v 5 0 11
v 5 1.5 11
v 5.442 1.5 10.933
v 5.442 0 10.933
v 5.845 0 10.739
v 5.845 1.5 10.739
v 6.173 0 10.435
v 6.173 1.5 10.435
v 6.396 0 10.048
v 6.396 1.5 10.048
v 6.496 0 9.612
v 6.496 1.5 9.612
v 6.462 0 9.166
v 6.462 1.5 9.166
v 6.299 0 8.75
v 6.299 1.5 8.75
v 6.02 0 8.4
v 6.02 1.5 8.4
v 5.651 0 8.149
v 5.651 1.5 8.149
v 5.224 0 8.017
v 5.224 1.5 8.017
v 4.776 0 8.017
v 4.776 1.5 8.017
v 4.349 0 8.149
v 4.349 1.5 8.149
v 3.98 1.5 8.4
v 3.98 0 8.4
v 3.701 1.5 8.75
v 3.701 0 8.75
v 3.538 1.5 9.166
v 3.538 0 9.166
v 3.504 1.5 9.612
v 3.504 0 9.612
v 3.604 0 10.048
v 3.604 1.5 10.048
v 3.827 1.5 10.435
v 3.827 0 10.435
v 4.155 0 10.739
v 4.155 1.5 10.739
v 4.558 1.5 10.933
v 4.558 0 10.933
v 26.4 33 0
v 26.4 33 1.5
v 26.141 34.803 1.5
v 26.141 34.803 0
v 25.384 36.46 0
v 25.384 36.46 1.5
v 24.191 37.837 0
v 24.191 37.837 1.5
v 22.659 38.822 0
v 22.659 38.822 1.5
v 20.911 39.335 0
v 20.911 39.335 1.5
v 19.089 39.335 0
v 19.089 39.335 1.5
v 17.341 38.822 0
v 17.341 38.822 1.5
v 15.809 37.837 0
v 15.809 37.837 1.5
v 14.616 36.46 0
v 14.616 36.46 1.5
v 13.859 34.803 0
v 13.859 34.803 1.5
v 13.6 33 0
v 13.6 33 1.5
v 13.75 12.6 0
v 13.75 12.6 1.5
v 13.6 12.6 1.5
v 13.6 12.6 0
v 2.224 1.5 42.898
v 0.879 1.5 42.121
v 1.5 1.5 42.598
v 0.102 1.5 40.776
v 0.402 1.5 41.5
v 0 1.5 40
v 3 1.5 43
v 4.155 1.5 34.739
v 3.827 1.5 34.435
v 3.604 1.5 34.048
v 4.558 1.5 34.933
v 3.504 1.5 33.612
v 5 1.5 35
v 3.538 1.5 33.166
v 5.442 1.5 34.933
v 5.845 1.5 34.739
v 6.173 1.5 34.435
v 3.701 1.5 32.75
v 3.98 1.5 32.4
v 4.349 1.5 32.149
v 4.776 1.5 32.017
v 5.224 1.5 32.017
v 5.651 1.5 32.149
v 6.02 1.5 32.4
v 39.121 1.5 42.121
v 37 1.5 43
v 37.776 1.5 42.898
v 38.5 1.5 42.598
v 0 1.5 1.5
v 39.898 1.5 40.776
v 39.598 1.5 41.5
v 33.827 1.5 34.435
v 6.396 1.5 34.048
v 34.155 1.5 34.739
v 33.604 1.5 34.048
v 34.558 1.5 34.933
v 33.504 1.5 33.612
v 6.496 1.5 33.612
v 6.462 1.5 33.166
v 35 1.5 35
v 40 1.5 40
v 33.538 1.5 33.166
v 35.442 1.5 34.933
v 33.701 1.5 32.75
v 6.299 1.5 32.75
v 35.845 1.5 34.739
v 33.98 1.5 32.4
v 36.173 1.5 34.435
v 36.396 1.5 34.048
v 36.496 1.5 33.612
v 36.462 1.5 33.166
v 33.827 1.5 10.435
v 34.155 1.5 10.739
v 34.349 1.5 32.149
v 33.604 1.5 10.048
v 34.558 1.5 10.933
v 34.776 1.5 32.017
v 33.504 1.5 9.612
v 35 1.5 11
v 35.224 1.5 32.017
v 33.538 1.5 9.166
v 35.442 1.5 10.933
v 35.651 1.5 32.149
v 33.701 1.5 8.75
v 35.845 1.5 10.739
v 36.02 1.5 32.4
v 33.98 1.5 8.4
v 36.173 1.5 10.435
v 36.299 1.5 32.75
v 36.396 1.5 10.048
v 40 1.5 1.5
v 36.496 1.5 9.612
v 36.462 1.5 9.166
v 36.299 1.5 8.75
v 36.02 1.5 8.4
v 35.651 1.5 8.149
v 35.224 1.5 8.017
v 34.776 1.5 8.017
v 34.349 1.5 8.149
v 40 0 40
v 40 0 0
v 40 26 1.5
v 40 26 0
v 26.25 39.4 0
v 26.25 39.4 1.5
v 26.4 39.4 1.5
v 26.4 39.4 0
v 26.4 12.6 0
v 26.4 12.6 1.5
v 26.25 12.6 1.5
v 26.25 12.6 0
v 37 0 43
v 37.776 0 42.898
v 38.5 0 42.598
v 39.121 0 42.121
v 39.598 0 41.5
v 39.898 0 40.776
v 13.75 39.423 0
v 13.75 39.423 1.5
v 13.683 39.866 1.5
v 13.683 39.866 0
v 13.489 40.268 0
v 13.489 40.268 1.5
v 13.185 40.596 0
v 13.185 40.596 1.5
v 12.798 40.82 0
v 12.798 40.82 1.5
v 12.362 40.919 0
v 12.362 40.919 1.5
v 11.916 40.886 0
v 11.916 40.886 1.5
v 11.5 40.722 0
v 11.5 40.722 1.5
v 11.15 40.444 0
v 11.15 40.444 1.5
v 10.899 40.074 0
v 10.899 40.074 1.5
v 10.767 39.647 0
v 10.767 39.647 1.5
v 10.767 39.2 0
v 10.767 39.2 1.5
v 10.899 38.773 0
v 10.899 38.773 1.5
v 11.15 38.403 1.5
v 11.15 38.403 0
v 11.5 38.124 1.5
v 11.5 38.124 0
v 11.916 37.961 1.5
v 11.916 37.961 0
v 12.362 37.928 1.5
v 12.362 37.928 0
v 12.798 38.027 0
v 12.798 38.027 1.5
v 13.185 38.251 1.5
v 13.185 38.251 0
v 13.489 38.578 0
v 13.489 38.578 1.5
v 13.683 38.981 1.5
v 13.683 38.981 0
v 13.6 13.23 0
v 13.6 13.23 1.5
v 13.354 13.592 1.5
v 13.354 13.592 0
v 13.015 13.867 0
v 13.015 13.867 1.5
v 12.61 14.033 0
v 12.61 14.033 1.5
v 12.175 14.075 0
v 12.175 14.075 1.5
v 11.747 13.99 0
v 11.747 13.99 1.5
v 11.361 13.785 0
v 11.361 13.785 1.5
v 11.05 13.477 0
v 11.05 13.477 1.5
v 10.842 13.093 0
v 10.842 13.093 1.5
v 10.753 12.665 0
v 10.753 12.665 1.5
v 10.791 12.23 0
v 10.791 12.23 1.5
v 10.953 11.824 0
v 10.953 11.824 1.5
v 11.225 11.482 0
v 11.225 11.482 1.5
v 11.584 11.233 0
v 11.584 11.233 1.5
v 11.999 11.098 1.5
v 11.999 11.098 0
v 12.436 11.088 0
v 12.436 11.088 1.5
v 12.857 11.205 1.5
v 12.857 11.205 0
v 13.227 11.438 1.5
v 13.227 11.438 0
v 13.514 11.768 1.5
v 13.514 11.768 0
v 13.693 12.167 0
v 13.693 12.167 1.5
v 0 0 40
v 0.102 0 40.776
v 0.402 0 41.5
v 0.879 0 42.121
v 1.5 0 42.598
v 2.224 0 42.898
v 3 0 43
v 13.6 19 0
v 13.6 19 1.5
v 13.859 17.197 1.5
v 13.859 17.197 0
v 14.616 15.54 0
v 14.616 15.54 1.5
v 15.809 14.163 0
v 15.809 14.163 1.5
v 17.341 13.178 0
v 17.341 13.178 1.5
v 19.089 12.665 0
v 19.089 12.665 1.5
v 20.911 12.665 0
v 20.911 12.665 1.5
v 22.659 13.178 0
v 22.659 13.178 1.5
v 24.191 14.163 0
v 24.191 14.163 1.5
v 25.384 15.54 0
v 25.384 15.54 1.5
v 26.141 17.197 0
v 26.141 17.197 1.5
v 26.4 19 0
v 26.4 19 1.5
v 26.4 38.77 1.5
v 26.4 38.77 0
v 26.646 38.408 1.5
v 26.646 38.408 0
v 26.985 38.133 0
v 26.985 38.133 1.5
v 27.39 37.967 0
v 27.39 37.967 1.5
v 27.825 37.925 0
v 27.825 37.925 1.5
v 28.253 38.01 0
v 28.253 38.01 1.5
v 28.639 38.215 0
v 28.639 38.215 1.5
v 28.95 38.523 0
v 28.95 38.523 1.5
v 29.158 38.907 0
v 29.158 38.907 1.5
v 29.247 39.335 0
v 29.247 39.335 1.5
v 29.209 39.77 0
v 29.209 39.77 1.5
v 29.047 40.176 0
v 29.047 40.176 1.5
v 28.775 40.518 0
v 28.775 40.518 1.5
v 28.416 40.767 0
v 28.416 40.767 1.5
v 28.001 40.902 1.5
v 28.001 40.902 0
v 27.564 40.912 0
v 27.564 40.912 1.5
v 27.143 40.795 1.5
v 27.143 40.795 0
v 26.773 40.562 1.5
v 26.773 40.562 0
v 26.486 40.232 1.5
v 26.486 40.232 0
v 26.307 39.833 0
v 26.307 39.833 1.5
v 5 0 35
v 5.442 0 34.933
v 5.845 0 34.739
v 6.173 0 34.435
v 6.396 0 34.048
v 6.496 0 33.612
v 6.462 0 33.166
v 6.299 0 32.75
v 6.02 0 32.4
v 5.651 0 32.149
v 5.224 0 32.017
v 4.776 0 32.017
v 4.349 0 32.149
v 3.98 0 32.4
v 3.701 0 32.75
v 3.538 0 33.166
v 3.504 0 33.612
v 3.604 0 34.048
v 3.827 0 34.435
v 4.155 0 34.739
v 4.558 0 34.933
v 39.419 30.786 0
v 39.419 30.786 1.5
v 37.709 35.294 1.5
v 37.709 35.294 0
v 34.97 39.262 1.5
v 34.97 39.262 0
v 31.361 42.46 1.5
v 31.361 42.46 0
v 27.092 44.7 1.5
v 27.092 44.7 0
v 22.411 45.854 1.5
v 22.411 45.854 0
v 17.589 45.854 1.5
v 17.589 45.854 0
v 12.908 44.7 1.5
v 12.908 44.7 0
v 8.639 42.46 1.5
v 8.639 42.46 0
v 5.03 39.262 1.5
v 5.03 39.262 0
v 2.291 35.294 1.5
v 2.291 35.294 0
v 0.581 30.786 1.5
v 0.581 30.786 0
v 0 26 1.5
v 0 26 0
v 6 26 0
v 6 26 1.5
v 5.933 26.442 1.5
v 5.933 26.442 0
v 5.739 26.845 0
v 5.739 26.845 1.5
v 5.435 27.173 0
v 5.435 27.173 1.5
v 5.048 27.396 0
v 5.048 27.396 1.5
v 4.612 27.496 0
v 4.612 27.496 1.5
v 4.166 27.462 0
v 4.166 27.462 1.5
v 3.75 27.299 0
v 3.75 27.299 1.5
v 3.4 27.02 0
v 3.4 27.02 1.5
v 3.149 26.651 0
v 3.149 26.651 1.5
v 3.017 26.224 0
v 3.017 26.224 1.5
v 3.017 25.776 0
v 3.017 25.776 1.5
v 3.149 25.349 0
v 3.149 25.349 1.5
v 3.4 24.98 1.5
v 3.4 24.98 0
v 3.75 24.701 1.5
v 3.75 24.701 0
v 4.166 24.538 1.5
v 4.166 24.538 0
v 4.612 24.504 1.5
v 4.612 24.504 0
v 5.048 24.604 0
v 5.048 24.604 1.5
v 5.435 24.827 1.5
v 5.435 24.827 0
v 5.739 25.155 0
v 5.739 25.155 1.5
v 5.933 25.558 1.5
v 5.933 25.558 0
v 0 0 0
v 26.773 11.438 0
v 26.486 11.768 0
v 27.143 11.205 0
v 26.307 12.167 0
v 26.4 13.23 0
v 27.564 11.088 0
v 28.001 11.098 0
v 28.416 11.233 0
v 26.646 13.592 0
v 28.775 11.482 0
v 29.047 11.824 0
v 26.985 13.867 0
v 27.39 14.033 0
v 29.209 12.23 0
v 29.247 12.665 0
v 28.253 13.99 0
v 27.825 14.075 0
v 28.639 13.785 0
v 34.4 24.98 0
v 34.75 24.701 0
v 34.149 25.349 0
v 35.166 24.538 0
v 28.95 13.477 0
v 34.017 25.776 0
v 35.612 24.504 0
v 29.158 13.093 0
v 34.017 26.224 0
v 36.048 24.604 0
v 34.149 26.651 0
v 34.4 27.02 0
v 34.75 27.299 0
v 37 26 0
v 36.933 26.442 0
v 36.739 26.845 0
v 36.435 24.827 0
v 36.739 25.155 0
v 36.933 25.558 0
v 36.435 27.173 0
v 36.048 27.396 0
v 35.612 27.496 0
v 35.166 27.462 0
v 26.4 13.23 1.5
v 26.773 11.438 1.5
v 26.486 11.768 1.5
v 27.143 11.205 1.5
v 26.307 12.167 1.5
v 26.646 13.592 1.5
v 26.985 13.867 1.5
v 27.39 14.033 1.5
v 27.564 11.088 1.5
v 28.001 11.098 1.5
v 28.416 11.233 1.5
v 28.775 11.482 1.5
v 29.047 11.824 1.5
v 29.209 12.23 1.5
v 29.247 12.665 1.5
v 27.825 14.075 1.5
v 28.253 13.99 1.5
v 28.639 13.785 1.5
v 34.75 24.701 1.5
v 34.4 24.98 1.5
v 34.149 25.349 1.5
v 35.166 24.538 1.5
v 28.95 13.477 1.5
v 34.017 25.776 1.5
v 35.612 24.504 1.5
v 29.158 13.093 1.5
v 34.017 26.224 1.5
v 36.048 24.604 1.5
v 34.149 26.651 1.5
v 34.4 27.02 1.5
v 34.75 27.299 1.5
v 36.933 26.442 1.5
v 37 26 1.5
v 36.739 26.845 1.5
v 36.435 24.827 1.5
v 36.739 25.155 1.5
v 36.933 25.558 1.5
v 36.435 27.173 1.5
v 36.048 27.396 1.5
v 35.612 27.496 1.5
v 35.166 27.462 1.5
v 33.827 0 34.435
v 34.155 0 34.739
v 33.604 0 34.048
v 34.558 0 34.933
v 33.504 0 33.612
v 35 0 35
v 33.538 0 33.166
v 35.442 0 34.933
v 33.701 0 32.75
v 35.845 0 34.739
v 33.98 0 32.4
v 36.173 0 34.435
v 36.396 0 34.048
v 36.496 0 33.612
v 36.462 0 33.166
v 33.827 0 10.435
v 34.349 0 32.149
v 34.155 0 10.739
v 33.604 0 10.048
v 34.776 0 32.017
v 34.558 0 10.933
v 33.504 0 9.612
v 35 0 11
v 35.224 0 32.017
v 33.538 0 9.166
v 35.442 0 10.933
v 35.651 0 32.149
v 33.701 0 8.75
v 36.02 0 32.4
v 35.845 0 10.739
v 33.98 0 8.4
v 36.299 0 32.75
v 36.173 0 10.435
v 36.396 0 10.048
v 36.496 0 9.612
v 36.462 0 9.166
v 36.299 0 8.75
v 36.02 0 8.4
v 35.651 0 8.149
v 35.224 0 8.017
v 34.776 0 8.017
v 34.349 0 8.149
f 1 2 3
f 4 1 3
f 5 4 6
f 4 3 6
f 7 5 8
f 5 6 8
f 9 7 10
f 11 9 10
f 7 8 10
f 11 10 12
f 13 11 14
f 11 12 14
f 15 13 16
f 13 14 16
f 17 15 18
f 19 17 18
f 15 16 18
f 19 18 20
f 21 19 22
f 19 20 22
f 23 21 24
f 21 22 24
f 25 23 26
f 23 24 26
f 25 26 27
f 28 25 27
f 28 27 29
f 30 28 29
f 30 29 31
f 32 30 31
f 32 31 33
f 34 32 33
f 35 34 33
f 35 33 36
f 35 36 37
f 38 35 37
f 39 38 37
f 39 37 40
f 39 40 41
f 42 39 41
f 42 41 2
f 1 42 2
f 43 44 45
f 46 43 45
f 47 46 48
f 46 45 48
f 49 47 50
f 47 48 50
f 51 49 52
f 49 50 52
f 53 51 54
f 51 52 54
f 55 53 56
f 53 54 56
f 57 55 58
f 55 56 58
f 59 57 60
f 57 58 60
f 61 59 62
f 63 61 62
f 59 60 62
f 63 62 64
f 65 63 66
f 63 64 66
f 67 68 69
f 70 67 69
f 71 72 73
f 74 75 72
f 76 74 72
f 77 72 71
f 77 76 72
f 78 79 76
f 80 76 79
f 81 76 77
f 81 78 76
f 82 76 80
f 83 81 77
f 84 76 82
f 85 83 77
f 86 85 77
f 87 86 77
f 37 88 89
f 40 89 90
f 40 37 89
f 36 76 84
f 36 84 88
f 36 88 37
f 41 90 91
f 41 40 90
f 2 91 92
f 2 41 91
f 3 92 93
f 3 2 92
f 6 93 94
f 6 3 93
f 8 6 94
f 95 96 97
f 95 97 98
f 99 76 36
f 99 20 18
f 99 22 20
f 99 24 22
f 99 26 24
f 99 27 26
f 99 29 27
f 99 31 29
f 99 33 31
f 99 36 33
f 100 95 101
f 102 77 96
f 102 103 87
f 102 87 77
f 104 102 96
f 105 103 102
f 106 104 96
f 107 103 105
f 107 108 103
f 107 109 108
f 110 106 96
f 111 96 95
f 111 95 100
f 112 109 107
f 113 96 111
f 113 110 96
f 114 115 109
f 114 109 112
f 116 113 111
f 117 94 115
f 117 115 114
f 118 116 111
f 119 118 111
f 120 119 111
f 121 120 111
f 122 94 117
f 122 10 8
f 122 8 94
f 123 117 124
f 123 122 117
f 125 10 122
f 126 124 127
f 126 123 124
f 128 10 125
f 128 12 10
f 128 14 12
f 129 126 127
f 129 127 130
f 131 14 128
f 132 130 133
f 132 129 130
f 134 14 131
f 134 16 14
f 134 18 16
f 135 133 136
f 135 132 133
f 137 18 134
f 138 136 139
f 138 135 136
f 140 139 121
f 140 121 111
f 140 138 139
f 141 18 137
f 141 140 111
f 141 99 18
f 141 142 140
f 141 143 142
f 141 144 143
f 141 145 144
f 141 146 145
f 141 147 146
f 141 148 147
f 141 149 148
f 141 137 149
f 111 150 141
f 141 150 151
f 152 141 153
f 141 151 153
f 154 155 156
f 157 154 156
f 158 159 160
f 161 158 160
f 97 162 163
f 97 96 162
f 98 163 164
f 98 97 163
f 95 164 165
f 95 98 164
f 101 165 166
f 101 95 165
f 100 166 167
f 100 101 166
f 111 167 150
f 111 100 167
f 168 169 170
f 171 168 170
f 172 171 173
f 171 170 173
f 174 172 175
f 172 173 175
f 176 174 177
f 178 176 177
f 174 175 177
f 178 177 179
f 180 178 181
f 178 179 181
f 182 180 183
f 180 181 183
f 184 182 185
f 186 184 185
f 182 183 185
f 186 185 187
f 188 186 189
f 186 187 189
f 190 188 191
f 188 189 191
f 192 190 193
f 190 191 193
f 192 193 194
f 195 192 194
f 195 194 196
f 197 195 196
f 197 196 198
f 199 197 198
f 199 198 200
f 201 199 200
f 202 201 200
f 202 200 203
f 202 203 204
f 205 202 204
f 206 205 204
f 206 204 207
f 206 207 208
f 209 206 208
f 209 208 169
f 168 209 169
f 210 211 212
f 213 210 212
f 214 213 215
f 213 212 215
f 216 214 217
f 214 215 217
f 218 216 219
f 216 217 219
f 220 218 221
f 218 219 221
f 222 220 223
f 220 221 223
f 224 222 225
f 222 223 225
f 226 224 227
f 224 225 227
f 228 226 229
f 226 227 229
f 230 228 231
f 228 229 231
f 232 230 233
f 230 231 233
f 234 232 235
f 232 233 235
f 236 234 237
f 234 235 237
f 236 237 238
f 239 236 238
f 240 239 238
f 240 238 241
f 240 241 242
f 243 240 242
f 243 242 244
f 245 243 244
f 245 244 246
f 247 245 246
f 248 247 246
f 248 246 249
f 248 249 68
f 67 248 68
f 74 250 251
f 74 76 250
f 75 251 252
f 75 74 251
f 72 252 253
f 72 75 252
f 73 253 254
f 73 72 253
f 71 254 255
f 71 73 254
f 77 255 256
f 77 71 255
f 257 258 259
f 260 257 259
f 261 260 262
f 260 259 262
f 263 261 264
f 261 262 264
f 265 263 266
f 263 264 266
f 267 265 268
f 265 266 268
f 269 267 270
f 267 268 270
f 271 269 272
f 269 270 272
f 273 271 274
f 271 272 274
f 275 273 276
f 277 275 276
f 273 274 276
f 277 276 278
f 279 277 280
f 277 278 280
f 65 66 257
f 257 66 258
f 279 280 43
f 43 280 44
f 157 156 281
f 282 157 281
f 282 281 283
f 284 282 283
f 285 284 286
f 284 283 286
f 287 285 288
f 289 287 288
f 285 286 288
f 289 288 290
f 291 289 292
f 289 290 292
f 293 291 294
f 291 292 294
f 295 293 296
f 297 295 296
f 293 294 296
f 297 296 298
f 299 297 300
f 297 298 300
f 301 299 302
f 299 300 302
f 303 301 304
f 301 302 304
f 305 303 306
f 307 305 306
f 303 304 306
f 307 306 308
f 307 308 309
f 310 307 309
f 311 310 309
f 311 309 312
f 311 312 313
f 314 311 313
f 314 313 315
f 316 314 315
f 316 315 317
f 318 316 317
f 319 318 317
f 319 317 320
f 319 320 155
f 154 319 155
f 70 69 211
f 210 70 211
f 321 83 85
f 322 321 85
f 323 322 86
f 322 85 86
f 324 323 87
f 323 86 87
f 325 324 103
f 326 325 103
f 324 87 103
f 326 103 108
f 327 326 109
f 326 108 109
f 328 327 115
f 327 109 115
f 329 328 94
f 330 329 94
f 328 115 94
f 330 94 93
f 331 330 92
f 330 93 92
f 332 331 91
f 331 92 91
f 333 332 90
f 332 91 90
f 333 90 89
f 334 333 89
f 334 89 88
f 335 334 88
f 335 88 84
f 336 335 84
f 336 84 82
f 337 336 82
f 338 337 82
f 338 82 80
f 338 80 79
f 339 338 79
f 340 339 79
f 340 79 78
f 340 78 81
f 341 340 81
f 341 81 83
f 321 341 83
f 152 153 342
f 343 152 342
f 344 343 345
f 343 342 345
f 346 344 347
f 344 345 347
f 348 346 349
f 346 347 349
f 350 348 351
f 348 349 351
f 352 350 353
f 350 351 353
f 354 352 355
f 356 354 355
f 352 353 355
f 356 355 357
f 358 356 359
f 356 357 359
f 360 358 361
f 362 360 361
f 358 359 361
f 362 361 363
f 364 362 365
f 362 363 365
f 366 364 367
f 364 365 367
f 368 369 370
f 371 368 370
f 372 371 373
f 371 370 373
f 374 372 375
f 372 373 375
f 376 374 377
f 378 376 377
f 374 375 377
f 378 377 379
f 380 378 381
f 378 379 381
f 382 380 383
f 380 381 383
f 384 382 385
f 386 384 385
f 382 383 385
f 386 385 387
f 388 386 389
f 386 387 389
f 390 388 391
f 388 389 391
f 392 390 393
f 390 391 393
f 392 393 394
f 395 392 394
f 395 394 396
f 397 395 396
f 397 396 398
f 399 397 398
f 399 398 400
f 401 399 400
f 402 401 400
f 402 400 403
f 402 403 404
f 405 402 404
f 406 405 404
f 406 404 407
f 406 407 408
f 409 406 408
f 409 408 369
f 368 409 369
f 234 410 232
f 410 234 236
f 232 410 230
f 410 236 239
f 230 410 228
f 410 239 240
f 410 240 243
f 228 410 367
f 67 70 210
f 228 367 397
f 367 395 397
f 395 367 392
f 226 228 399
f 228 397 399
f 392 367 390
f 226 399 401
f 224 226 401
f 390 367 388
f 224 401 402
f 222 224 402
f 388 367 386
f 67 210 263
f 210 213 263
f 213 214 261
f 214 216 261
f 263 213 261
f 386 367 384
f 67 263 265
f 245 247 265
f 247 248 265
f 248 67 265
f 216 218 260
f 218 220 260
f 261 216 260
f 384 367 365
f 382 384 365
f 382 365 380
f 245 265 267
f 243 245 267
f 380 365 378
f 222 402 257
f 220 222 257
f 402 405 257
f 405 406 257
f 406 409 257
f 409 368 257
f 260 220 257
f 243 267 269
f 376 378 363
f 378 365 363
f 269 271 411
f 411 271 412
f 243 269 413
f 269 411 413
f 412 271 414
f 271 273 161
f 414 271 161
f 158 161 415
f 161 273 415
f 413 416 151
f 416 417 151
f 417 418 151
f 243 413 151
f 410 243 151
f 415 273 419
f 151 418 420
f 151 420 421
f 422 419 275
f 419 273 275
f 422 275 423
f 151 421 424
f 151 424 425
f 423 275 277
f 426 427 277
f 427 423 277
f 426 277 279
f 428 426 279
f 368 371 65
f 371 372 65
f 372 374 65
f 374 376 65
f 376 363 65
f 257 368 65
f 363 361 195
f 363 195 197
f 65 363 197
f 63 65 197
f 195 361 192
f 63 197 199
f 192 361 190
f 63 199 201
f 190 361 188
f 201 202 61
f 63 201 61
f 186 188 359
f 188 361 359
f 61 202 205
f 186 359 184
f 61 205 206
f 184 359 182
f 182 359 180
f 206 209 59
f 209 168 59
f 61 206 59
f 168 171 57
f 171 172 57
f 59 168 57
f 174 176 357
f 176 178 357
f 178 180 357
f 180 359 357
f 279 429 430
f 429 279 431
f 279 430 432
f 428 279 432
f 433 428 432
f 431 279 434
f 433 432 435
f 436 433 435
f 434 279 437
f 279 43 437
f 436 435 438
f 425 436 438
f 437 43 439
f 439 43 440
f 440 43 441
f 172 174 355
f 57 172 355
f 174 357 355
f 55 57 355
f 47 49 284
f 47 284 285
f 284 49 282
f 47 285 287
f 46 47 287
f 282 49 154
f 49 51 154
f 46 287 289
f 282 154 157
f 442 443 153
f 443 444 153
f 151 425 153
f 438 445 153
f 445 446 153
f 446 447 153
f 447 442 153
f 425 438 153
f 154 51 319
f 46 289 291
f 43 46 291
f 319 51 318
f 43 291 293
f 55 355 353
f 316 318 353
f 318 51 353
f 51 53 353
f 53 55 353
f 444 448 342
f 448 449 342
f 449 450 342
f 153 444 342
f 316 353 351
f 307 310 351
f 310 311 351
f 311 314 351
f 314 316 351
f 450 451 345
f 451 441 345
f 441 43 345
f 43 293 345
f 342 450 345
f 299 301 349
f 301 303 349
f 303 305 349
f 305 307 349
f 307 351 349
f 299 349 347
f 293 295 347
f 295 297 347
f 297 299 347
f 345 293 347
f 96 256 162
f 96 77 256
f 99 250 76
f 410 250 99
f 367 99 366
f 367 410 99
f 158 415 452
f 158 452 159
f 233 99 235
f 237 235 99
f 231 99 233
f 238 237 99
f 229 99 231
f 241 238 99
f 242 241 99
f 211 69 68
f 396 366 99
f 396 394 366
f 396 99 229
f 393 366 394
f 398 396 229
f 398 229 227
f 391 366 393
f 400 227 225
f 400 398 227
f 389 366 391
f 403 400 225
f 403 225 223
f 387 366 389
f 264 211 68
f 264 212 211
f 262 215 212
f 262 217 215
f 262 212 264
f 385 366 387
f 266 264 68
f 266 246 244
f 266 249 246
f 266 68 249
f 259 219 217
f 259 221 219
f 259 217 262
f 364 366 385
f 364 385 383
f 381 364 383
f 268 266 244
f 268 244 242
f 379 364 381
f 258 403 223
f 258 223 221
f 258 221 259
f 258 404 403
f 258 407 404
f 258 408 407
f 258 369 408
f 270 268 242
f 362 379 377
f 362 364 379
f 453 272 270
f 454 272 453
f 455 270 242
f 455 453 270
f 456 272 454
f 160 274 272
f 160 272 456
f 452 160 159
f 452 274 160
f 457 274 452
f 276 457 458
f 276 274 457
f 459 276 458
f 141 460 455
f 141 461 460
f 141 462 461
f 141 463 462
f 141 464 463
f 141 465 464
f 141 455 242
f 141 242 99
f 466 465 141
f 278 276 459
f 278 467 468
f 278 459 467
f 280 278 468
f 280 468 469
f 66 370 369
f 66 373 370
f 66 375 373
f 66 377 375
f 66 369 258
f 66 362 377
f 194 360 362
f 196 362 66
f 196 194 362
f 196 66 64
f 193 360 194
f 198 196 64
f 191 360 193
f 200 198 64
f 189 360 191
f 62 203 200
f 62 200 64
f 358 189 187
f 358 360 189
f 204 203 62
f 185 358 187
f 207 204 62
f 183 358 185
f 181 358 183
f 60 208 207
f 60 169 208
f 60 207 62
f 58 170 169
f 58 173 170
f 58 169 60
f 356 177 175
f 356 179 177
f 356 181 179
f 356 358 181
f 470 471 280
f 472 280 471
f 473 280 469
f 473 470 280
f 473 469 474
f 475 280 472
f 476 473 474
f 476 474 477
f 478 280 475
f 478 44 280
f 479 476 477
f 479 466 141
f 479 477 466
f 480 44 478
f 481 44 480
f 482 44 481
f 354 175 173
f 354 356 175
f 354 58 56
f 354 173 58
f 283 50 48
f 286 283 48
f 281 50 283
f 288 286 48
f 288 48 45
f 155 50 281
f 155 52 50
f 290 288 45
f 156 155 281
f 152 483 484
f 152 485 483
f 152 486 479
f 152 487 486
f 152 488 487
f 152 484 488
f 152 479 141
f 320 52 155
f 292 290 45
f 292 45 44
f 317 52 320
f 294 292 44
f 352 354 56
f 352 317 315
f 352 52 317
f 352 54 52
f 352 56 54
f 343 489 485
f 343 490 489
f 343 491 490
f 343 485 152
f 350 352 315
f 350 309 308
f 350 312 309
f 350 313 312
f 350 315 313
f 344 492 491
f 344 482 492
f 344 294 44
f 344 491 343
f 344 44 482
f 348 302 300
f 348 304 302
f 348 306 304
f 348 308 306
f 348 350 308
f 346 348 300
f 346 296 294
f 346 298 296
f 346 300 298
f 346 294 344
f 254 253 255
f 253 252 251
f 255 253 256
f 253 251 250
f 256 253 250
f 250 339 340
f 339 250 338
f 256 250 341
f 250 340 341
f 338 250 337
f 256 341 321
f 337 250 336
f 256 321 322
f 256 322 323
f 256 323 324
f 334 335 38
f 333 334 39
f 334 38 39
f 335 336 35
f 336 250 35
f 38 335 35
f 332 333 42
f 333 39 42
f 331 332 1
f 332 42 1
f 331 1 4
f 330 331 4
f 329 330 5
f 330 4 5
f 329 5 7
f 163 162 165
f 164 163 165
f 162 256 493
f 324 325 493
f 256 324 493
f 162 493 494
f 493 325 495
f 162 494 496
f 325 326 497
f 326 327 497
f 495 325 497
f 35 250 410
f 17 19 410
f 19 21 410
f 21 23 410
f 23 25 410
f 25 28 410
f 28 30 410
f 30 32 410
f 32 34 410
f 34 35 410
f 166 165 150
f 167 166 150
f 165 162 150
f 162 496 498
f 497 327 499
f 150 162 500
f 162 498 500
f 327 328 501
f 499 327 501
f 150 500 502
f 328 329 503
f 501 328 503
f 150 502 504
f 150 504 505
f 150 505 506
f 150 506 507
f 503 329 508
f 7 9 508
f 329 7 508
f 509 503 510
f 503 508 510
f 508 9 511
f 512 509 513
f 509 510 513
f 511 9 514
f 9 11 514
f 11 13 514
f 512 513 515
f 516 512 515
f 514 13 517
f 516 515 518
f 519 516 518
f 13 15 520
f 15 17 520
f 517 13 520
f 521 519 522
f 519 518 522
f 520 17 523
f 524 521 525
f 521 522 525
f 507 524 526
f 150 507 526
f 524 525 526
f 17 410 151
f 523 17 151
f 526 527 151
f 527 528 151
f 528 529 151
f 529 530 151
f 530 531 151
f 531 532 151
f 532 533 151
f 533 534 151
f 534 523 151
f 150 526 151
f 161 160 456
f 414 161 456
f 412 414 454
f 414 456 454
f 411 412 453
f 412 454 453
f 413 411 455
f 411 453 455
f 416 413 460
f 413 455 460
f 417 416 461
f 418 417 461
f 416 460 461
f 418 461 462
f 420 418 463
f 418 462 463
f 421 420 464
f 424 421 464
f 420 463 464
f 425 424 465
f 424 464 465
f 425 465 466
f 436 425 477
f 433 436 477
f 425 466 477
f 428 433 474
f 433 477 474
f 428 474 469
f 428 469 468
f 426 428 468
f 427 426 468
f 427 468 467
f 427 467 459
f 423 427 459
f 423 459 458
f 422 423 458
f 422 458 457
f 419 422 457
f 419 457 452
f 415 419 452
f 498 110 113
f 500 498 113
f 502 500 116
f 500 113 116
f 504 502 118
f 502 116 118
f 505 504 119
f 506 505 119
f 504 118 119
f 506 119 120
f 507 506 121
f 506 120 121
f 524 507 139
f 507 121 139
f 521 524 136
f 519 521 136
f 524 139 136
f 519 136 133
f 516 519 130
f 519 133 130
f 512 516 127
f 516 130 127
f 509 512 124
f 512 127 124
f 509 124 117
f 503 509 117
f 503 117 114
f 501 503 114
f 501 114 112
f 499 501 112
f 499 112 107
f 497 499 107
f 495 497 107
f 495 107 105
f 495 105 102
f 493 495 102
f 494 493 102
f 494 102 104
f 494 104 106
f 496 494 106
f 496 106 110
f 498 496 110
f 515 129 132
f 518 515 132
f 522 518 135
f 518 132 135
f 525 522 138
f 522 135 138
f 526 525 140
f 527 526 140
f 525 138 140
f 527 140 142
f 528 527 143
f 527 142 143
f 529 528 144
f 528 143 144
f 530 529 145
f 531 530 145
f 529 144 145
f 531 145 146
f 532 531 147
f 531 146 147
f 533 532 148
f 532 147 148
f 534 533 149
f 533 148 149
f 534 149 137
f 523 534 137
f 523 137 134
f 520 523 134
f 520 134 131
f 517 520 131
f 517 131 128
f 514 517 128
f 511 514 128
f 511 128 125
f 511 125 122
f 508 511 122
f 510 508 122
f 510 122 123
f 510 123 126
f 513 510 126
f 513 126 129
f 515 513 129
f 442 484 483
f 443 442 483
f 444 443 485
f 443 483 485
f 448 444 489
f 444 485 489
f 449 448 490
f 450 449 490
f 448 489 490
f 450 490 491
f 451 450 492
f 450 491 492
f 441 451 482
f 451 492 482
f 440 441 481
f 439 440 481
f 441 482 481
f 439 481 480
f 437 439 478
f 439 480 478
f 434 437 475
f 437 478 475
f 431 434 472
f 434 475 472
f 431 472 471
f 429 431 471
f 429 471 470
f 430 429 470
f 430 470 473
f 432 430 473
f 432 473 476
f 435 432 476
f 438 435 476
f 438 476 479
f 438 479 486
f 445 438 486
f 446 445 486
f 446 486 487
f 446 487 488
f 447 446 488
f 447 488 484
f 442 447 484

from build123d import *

# Parameters (mm, degrees)
SALIENTE_EXTRUIR1_DEPTH = 1.5
CROQUIS2_W              = 40
CROQUIS2_H              = 1.5
SALIENTE_EXTRUIR2_DEPTH = 41.5
CROQUIS3_R              = 1.5
CORTAR_EXTRUIR1_DEPTH   = 41.5
CROQUIS4_R              = 1.5
CORTAR_EXTRUIR2_DEPTH   = 41.5
FILLET1_R               = 3


with BuildPart() as part:
    # Croquis1 → Saliente-Extruir1 (new body)
    with BuildSketch(Plane.XY):
        with BuildLine():
            Line((0, 0), (40, 0))
            Line((40, 0), (40, 26))
            ThreePointArc((40, 26), (20, 46), (0, 26))
            Line((0, 26), (0, 0))
        make_face()
    extrude(amount=SALIENTE_EXTRUIR1_DEPTH)

    # Croquis2 → Saliente-Extruir2 (add)
    with BuildSketch(Plane.XY.offset(1.5)):
        with Locations((20, 0.75)):
            Rectangle(CROQUIS2_W, CROQUIS2_H)
    extrude(amount=SALIENTE_EXTRUIR2_DEPTH)

    # Croquis3 → Cortar-Extruir1 (cut)
    with BuildSketch(Plane(origin=(0, 1.5, 0), x_dir=(1, 0, 0), z_dir=(0, 1, 0))):
        with Locations(Location((5, -33.5, 0), (0, 0, 270))):
            Circle(CROQUIS3_R)
        with Locations(Location((5, -9.5, 0), (0, 0, 270))):
            Circle(CROQUIS3_R)
        with Locations(Location((35, -9.5, 0), (0, 0, 270))):
            Circle(CROQUIS3_R)
        with Locations(Location((35, -33.5, 0), (0, 0, 270))):
            Circle(CROQUIS3_R)
    extrude(amount=-CORTAR_EXTRUIR1_DEPTH, mode=Mode.SUBTRACT)

    # Croquis4 → Cortar-Extruir2 (cut)
    with BuildSketch(Plane.XY.offset(1.5)):
        with BuildLine():
            ThreePointArc((26.4, 33), (20, 39.4), (13.6, 33))
            Line((13.6, 33), (13.6, 19))
            ThreePointArc((13.6, 19), (20, 12.6), (26.4, 19))
            Line((26.4, 19), (26.4, 33))
        make_face()
        with Locations((12.25, 39.423393759)):
            Circle(CROQUIS4_R)
        with BuildLine():
            Line((13.749817566, 12.6), (13.6, 12.6))
            Line((13.6, 12.6), (13.6, 13.230441083))
            ThreePointArc((13.6, 13.230441083), (10.790640884, 12.229805189), (13.749817566, 12.6))
        make_face()
        with BuildLine():
            Line((26.250182434, 39.4), (26.4, 39.4))
            Line((26.4, 39.4), (26.4, 38.769558917))
            ThreePointArc((26.4, 38.769558917), (29.209359116, 39.770194811), (26.250182434, 39.4))
        make_face()
        with BuildLine():
            Line((26.4, 12.6), (26.250182434, 12.6))
            ThreePointArc((26.250182434, 12.6), (29.209359116, 12.229805189), (26.4, 13.230441083))
            Line((26.4, 13.230441083), (26.4, 12.6))
        make_face()
        with Locations((4.5, 26)):
            Circle(CROQUIS4_R)
        with Locations((35.5, 26)):
            Circle(CROQUIS4_R)
    extrude(amount=-CORTAR_EXTRUIR2_DEPTH, mode=Mode.SUBTRACT)

    # Fillet1
    fillet1_edges = [part.edges().sort_by_distance(p)[0] for p in [
        (0, 0.75, 43),
        (40, 0.75, 43),
    ]]
    fillet(fillet1_edges, radius=FILLET1_R)


solid = part.part
